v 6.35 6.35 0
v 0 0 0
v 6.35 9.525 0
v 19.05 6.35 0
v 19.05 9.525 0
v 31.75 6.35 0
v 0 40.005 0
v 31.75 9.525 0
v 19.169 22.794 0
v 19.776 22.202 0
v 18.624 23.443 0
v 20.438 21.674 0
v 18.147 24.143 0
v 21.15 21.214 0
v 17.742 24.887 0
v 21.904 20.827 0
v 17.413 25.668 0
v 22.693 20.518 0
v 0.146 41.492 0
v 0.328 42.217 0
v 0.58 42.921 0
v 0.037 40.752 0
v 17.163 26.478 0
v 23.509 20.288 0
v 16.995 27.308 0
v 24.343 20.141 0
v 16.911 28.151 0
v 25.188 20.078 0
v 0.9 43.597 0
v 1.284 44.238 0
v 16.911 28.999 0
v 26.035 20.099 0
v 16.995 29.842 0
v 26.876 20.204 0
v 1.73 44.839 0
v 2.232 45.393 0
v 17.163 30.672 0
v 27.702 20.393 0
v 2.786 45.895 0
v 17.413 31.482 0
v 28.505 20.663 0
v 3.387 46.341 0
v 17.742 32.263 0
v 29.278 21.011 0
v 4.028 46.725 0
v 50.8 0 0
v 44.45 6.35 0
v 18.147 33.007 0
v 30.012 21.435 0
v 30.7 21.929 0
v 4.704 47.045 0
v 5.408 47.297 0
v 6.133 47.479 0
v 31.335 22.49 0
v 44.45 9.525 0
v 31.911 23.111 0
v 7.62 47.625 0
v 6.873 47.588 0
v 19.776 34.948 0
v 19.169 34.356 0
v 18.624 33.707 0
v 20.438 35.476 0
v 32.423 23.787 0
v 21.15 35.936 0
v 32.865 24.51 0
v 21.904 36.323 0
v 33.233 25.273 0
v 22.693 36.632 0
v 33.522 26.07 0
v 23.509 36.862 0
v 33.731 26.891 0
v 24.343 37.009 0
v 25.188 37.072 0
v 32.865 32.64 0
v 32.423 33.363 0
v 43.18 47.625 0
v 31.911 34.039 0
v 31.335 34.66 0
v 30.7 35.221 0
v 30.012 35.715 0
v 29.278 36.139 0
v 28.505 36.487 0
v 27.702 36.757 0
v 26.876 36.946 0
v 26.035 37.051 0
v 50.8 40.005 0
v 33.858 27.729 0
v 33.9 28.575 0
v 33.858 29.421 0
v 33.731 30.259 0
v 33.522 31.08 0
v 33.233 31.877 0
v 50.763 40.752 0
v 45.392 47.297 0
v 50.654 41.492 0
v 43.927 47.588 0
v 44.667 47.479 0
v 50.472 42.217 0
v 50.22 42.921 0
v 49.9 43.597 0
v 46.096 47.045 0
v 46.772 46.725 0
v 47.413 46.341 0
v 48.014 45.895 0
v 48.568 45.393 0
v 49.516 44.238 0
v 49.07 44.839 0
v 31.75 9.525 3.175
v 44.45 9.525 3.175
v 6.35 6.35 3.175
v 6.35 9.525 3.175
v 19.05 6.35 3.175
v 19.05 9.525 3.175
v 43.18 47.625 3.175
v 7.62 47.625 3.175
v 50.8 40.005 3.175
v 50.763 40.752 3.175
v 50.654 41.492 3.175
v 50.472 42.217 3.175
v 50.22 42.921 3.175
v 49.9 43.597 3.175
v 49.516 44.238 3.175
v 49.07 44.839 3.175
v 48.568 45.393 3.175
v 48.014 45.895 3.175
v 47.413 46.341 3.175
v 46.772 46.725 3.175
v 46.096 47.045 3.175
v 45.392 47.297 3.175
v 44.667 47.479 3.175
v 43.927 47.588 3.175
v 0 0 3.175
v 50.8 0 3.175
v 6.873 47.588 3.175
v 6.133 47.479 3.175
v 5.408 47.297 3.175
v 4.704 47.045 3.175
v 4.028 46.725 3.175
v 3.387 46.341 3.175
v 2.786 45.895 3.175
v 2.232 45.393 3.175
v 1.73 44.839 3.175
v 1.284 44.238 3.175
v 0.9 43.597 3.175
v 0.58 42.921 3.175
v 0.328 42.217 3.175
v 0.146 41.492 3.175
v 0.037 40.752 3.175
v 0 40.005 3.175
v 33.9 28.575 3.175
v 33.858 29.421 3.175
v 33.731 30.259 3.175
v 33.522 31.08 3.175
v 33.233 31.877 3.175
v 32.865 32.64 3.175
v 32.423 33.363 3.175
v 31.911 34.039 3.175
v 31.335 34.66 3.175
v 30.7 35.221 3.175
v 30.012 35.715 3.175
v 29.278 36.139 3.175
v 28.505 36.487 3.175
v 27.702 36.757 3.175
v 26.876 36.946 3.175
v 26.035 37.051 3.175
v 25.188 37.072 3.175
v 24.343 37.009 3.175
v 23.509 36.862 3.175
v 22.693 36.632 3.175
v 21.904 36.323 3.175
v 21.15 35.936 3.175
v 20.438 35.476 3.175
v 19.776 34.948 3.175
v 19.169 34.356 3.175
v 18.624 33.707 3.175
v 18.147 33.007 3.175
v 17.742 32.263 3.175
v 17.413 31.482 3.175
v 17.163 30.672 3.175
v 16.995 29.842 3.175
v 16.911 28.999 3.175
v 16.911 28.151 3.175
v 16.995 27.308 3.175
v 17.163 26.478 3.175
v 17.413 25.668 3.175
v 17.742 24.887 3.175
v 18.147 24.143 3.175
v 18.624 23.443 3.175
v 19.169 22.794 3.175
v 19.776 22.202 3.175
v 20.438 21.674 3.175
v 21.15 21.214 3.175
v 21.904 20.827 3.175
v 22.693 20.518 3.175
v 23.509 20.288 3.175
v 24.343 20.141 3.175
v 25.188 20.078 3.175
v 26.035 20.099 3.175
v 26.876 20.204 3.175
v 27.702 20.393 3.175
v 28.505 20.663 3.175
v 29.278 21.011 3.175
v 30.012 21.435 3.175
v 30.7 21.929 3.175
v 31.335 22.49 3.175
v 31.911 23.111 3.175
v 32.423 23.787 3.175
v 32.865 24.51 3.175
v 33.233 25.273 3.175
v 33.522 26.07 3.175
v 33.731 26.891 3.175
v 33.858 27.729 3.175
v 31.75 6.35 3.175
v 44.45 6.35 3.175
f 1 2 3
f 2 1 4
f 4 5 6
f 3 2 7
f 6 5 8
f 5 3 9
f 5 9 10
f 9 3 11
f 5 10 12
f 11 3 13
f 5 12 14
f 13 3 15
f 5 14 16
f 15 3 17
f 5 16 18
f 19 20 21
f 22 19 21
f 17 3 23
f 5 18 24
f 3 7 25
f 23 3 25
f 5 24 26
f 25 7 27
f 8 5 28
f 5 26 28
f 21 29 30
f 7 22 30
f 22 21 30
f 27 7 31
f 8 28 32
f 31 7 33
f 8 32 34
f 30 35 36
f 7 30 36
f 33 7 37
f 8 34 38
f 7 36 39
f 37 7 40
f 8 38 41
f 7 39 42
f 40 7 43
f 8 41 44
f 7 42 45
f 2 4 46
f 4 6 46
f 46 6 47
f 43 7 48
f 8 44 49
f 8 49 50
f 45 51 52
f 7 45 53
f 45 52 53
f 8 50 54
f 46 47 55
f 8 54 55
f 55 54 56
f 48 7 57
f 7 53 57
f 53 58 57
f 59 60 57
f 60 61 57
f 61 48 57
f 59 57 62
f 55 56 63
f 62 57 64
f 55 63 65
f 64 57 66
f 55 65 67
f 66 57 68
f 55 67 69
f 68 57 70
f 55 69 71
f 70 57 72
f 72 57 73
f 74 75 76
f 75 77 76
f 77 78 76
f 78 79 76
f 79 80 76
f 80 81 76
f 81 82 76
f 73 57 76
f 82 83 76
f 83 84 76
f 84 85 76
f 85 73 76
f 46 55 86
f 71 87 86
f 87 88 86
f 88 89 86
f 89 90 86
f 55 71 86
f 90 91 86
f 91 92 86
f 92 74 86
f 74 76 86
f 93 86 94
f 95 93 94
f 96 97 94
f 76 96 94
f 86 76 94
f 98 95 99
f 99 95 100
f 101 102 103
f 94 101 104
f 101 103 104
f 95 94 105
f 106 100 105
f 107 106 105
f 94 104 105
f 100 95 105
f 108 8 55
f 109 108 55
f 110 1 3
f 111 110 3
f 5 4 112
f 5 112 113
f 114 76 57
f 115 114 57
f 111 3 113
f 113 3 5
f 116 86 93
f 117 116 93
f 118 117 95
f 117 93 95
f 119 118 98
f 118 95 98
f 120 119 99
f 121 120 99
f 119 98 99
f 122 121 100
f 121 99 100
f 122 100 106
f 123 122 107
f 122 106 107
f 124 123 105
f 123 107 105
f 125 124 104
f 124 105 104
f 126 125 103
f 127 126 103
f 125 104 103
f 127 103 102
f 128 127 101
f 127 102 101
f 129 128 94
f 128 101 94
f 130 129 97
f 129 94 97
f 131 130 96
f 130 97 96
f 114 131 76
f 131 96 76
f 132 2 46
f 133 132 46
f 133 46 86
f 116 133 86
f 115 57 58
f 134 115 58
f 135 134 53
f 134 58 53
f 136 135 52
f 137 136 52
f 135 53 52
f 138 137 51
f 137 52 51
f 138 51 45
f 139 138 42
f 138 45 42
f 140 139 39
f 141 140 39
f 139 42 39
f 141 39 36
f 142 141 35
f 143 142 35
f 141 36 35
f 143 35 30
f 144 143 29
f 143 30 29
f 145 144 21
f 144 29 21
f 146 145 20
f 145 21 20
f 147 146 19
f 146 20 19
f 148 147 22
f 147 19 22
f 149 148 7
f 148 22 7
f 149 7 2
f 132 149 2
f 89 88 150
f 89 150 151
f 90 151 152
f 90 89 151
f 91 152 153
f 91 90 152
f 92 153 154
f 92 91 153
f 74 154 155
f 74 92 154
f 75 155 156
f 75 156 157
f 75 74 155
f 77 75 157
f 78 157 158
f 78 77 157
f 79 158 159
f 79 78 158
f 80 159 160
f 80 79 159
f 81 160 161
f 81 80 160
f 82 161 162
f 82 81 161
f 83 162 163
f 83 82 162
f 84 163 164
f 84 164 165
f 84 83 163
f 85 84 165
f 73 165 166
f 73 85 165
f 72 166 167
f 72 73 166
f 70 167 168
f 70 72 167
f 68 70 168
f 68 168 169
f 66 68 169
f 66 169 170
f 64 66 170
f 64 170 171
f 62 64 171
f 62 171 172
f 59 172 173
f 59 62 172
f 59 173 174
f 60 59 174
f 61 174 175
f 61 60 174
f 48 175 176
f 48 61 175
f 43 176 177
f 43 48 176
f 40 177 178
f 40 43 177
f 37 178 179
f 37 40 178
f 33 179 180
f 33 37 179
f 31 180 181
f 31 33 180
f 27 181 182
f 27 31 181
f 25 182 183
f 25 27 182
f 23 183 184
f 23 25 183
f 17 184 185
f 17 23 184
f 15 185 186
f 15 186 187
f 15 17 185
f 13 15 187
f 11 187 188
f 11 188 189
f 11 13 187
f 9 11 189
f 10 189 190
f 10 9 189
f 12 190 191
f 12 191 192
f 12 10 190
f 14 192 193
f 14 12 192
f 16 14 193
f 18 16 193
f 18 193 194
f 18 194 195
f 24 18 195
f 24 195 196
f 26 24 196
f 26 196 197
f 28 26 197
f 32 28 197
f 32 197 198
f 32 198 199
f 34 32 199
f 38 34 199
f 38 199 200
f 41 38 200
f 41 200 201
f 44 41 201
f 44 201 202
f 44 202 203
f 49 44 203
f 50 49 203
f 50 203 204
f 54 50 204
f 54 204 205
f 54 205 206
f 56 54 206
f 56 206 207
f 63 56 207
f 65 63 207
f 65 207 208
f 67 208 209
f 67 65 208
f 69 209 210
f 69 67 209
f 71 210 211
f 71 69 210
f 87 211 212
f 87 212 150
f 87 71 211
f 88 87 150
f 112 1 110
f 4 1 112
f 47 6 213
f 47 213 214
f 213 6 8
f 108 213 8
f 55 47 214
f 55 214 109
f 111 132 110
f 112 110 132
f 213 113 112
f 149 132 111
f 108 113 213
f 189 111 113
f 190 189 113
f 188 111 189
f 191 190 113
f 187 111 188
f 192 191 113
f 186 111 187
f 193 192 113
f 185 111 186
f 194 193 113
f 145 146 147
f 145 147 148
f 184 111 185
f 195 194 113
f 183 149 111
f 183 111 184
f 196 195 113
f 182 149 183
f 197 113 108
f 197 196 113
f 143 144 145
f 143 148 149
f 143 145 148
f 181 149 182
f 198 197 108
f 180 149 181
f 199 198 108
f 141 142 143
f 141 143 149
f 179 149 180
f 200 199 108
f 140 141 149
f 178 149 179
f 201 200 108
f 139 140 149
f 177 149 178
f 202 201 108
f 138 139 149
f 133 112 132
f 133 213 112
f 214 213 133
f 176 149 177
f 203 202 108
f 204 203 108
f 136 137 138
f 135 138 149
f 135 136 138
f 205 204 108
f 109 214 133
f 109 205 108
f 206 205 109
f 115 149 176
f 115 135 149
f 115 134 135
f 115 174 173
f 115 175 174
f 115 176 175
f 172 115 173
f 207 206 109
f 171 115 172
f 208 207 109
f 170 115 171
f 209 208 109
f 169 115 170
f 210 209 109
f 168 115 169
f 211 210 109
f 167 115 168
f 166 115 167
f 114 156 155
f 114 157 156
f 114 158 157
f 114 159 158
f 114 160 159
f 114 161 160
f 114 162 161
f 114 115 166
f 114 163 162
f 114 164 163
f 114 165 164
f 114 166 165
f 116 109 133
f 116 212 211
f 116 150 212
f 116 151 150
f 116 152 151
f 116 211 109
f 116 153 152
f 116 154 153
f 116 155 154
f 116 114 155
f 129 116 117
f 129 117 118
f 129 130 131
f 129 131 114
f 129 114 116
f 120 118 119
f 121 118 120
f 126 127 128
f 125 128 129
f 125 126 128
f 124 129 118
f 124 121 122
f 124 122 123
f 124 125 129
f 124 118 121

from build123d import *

# Parameters (mm, degrees)
SKETCH1_R           = 8.5
SKETCH1_W           = 12.7
SKETCH1_H           = 3.175
BOSS_EXTRUDE1_DEPTH = 3.175


with BuildPart() as part:
    # Sketch1 → Boss-Extrude1 (new body)
    with BuildSketch(Plane.XY):
        with BuildLine():
            Line((50.8, 0), (50.8, 40.005))
            ThreePointArc((50.8, 40.005), (48.568153673, 45.393153673), (43.18, 47.625))
            Line((43.18, 47.625), (7.62, 47.625))
            ThreePointArc((7.62, 47.625), (2.231846327, 45.393153673), (0, 40.005))
            Line((0, 40.005), (0, 0))
            Line((0, 0), (50.8, 0))
        make_face()
        with Locations((25.4, 28.575)):
            Circle(SKETCH1_R, mode=Mode.SUBTRACT)
        with Locations((12.7, 7.9375)):
            Rectangle(SKETCH1_W, SKETCH1_H, mode=Mode.SUBTRACT)
        with Locations((38.1, 7.9375)):
            Rectangle(SKETCH1_W, SKETCH1_H, mode=Mode.SUBTRACT)
    extrude(amount=BOSS_EXTRUDE1_DEPTH)


solid = part.part
